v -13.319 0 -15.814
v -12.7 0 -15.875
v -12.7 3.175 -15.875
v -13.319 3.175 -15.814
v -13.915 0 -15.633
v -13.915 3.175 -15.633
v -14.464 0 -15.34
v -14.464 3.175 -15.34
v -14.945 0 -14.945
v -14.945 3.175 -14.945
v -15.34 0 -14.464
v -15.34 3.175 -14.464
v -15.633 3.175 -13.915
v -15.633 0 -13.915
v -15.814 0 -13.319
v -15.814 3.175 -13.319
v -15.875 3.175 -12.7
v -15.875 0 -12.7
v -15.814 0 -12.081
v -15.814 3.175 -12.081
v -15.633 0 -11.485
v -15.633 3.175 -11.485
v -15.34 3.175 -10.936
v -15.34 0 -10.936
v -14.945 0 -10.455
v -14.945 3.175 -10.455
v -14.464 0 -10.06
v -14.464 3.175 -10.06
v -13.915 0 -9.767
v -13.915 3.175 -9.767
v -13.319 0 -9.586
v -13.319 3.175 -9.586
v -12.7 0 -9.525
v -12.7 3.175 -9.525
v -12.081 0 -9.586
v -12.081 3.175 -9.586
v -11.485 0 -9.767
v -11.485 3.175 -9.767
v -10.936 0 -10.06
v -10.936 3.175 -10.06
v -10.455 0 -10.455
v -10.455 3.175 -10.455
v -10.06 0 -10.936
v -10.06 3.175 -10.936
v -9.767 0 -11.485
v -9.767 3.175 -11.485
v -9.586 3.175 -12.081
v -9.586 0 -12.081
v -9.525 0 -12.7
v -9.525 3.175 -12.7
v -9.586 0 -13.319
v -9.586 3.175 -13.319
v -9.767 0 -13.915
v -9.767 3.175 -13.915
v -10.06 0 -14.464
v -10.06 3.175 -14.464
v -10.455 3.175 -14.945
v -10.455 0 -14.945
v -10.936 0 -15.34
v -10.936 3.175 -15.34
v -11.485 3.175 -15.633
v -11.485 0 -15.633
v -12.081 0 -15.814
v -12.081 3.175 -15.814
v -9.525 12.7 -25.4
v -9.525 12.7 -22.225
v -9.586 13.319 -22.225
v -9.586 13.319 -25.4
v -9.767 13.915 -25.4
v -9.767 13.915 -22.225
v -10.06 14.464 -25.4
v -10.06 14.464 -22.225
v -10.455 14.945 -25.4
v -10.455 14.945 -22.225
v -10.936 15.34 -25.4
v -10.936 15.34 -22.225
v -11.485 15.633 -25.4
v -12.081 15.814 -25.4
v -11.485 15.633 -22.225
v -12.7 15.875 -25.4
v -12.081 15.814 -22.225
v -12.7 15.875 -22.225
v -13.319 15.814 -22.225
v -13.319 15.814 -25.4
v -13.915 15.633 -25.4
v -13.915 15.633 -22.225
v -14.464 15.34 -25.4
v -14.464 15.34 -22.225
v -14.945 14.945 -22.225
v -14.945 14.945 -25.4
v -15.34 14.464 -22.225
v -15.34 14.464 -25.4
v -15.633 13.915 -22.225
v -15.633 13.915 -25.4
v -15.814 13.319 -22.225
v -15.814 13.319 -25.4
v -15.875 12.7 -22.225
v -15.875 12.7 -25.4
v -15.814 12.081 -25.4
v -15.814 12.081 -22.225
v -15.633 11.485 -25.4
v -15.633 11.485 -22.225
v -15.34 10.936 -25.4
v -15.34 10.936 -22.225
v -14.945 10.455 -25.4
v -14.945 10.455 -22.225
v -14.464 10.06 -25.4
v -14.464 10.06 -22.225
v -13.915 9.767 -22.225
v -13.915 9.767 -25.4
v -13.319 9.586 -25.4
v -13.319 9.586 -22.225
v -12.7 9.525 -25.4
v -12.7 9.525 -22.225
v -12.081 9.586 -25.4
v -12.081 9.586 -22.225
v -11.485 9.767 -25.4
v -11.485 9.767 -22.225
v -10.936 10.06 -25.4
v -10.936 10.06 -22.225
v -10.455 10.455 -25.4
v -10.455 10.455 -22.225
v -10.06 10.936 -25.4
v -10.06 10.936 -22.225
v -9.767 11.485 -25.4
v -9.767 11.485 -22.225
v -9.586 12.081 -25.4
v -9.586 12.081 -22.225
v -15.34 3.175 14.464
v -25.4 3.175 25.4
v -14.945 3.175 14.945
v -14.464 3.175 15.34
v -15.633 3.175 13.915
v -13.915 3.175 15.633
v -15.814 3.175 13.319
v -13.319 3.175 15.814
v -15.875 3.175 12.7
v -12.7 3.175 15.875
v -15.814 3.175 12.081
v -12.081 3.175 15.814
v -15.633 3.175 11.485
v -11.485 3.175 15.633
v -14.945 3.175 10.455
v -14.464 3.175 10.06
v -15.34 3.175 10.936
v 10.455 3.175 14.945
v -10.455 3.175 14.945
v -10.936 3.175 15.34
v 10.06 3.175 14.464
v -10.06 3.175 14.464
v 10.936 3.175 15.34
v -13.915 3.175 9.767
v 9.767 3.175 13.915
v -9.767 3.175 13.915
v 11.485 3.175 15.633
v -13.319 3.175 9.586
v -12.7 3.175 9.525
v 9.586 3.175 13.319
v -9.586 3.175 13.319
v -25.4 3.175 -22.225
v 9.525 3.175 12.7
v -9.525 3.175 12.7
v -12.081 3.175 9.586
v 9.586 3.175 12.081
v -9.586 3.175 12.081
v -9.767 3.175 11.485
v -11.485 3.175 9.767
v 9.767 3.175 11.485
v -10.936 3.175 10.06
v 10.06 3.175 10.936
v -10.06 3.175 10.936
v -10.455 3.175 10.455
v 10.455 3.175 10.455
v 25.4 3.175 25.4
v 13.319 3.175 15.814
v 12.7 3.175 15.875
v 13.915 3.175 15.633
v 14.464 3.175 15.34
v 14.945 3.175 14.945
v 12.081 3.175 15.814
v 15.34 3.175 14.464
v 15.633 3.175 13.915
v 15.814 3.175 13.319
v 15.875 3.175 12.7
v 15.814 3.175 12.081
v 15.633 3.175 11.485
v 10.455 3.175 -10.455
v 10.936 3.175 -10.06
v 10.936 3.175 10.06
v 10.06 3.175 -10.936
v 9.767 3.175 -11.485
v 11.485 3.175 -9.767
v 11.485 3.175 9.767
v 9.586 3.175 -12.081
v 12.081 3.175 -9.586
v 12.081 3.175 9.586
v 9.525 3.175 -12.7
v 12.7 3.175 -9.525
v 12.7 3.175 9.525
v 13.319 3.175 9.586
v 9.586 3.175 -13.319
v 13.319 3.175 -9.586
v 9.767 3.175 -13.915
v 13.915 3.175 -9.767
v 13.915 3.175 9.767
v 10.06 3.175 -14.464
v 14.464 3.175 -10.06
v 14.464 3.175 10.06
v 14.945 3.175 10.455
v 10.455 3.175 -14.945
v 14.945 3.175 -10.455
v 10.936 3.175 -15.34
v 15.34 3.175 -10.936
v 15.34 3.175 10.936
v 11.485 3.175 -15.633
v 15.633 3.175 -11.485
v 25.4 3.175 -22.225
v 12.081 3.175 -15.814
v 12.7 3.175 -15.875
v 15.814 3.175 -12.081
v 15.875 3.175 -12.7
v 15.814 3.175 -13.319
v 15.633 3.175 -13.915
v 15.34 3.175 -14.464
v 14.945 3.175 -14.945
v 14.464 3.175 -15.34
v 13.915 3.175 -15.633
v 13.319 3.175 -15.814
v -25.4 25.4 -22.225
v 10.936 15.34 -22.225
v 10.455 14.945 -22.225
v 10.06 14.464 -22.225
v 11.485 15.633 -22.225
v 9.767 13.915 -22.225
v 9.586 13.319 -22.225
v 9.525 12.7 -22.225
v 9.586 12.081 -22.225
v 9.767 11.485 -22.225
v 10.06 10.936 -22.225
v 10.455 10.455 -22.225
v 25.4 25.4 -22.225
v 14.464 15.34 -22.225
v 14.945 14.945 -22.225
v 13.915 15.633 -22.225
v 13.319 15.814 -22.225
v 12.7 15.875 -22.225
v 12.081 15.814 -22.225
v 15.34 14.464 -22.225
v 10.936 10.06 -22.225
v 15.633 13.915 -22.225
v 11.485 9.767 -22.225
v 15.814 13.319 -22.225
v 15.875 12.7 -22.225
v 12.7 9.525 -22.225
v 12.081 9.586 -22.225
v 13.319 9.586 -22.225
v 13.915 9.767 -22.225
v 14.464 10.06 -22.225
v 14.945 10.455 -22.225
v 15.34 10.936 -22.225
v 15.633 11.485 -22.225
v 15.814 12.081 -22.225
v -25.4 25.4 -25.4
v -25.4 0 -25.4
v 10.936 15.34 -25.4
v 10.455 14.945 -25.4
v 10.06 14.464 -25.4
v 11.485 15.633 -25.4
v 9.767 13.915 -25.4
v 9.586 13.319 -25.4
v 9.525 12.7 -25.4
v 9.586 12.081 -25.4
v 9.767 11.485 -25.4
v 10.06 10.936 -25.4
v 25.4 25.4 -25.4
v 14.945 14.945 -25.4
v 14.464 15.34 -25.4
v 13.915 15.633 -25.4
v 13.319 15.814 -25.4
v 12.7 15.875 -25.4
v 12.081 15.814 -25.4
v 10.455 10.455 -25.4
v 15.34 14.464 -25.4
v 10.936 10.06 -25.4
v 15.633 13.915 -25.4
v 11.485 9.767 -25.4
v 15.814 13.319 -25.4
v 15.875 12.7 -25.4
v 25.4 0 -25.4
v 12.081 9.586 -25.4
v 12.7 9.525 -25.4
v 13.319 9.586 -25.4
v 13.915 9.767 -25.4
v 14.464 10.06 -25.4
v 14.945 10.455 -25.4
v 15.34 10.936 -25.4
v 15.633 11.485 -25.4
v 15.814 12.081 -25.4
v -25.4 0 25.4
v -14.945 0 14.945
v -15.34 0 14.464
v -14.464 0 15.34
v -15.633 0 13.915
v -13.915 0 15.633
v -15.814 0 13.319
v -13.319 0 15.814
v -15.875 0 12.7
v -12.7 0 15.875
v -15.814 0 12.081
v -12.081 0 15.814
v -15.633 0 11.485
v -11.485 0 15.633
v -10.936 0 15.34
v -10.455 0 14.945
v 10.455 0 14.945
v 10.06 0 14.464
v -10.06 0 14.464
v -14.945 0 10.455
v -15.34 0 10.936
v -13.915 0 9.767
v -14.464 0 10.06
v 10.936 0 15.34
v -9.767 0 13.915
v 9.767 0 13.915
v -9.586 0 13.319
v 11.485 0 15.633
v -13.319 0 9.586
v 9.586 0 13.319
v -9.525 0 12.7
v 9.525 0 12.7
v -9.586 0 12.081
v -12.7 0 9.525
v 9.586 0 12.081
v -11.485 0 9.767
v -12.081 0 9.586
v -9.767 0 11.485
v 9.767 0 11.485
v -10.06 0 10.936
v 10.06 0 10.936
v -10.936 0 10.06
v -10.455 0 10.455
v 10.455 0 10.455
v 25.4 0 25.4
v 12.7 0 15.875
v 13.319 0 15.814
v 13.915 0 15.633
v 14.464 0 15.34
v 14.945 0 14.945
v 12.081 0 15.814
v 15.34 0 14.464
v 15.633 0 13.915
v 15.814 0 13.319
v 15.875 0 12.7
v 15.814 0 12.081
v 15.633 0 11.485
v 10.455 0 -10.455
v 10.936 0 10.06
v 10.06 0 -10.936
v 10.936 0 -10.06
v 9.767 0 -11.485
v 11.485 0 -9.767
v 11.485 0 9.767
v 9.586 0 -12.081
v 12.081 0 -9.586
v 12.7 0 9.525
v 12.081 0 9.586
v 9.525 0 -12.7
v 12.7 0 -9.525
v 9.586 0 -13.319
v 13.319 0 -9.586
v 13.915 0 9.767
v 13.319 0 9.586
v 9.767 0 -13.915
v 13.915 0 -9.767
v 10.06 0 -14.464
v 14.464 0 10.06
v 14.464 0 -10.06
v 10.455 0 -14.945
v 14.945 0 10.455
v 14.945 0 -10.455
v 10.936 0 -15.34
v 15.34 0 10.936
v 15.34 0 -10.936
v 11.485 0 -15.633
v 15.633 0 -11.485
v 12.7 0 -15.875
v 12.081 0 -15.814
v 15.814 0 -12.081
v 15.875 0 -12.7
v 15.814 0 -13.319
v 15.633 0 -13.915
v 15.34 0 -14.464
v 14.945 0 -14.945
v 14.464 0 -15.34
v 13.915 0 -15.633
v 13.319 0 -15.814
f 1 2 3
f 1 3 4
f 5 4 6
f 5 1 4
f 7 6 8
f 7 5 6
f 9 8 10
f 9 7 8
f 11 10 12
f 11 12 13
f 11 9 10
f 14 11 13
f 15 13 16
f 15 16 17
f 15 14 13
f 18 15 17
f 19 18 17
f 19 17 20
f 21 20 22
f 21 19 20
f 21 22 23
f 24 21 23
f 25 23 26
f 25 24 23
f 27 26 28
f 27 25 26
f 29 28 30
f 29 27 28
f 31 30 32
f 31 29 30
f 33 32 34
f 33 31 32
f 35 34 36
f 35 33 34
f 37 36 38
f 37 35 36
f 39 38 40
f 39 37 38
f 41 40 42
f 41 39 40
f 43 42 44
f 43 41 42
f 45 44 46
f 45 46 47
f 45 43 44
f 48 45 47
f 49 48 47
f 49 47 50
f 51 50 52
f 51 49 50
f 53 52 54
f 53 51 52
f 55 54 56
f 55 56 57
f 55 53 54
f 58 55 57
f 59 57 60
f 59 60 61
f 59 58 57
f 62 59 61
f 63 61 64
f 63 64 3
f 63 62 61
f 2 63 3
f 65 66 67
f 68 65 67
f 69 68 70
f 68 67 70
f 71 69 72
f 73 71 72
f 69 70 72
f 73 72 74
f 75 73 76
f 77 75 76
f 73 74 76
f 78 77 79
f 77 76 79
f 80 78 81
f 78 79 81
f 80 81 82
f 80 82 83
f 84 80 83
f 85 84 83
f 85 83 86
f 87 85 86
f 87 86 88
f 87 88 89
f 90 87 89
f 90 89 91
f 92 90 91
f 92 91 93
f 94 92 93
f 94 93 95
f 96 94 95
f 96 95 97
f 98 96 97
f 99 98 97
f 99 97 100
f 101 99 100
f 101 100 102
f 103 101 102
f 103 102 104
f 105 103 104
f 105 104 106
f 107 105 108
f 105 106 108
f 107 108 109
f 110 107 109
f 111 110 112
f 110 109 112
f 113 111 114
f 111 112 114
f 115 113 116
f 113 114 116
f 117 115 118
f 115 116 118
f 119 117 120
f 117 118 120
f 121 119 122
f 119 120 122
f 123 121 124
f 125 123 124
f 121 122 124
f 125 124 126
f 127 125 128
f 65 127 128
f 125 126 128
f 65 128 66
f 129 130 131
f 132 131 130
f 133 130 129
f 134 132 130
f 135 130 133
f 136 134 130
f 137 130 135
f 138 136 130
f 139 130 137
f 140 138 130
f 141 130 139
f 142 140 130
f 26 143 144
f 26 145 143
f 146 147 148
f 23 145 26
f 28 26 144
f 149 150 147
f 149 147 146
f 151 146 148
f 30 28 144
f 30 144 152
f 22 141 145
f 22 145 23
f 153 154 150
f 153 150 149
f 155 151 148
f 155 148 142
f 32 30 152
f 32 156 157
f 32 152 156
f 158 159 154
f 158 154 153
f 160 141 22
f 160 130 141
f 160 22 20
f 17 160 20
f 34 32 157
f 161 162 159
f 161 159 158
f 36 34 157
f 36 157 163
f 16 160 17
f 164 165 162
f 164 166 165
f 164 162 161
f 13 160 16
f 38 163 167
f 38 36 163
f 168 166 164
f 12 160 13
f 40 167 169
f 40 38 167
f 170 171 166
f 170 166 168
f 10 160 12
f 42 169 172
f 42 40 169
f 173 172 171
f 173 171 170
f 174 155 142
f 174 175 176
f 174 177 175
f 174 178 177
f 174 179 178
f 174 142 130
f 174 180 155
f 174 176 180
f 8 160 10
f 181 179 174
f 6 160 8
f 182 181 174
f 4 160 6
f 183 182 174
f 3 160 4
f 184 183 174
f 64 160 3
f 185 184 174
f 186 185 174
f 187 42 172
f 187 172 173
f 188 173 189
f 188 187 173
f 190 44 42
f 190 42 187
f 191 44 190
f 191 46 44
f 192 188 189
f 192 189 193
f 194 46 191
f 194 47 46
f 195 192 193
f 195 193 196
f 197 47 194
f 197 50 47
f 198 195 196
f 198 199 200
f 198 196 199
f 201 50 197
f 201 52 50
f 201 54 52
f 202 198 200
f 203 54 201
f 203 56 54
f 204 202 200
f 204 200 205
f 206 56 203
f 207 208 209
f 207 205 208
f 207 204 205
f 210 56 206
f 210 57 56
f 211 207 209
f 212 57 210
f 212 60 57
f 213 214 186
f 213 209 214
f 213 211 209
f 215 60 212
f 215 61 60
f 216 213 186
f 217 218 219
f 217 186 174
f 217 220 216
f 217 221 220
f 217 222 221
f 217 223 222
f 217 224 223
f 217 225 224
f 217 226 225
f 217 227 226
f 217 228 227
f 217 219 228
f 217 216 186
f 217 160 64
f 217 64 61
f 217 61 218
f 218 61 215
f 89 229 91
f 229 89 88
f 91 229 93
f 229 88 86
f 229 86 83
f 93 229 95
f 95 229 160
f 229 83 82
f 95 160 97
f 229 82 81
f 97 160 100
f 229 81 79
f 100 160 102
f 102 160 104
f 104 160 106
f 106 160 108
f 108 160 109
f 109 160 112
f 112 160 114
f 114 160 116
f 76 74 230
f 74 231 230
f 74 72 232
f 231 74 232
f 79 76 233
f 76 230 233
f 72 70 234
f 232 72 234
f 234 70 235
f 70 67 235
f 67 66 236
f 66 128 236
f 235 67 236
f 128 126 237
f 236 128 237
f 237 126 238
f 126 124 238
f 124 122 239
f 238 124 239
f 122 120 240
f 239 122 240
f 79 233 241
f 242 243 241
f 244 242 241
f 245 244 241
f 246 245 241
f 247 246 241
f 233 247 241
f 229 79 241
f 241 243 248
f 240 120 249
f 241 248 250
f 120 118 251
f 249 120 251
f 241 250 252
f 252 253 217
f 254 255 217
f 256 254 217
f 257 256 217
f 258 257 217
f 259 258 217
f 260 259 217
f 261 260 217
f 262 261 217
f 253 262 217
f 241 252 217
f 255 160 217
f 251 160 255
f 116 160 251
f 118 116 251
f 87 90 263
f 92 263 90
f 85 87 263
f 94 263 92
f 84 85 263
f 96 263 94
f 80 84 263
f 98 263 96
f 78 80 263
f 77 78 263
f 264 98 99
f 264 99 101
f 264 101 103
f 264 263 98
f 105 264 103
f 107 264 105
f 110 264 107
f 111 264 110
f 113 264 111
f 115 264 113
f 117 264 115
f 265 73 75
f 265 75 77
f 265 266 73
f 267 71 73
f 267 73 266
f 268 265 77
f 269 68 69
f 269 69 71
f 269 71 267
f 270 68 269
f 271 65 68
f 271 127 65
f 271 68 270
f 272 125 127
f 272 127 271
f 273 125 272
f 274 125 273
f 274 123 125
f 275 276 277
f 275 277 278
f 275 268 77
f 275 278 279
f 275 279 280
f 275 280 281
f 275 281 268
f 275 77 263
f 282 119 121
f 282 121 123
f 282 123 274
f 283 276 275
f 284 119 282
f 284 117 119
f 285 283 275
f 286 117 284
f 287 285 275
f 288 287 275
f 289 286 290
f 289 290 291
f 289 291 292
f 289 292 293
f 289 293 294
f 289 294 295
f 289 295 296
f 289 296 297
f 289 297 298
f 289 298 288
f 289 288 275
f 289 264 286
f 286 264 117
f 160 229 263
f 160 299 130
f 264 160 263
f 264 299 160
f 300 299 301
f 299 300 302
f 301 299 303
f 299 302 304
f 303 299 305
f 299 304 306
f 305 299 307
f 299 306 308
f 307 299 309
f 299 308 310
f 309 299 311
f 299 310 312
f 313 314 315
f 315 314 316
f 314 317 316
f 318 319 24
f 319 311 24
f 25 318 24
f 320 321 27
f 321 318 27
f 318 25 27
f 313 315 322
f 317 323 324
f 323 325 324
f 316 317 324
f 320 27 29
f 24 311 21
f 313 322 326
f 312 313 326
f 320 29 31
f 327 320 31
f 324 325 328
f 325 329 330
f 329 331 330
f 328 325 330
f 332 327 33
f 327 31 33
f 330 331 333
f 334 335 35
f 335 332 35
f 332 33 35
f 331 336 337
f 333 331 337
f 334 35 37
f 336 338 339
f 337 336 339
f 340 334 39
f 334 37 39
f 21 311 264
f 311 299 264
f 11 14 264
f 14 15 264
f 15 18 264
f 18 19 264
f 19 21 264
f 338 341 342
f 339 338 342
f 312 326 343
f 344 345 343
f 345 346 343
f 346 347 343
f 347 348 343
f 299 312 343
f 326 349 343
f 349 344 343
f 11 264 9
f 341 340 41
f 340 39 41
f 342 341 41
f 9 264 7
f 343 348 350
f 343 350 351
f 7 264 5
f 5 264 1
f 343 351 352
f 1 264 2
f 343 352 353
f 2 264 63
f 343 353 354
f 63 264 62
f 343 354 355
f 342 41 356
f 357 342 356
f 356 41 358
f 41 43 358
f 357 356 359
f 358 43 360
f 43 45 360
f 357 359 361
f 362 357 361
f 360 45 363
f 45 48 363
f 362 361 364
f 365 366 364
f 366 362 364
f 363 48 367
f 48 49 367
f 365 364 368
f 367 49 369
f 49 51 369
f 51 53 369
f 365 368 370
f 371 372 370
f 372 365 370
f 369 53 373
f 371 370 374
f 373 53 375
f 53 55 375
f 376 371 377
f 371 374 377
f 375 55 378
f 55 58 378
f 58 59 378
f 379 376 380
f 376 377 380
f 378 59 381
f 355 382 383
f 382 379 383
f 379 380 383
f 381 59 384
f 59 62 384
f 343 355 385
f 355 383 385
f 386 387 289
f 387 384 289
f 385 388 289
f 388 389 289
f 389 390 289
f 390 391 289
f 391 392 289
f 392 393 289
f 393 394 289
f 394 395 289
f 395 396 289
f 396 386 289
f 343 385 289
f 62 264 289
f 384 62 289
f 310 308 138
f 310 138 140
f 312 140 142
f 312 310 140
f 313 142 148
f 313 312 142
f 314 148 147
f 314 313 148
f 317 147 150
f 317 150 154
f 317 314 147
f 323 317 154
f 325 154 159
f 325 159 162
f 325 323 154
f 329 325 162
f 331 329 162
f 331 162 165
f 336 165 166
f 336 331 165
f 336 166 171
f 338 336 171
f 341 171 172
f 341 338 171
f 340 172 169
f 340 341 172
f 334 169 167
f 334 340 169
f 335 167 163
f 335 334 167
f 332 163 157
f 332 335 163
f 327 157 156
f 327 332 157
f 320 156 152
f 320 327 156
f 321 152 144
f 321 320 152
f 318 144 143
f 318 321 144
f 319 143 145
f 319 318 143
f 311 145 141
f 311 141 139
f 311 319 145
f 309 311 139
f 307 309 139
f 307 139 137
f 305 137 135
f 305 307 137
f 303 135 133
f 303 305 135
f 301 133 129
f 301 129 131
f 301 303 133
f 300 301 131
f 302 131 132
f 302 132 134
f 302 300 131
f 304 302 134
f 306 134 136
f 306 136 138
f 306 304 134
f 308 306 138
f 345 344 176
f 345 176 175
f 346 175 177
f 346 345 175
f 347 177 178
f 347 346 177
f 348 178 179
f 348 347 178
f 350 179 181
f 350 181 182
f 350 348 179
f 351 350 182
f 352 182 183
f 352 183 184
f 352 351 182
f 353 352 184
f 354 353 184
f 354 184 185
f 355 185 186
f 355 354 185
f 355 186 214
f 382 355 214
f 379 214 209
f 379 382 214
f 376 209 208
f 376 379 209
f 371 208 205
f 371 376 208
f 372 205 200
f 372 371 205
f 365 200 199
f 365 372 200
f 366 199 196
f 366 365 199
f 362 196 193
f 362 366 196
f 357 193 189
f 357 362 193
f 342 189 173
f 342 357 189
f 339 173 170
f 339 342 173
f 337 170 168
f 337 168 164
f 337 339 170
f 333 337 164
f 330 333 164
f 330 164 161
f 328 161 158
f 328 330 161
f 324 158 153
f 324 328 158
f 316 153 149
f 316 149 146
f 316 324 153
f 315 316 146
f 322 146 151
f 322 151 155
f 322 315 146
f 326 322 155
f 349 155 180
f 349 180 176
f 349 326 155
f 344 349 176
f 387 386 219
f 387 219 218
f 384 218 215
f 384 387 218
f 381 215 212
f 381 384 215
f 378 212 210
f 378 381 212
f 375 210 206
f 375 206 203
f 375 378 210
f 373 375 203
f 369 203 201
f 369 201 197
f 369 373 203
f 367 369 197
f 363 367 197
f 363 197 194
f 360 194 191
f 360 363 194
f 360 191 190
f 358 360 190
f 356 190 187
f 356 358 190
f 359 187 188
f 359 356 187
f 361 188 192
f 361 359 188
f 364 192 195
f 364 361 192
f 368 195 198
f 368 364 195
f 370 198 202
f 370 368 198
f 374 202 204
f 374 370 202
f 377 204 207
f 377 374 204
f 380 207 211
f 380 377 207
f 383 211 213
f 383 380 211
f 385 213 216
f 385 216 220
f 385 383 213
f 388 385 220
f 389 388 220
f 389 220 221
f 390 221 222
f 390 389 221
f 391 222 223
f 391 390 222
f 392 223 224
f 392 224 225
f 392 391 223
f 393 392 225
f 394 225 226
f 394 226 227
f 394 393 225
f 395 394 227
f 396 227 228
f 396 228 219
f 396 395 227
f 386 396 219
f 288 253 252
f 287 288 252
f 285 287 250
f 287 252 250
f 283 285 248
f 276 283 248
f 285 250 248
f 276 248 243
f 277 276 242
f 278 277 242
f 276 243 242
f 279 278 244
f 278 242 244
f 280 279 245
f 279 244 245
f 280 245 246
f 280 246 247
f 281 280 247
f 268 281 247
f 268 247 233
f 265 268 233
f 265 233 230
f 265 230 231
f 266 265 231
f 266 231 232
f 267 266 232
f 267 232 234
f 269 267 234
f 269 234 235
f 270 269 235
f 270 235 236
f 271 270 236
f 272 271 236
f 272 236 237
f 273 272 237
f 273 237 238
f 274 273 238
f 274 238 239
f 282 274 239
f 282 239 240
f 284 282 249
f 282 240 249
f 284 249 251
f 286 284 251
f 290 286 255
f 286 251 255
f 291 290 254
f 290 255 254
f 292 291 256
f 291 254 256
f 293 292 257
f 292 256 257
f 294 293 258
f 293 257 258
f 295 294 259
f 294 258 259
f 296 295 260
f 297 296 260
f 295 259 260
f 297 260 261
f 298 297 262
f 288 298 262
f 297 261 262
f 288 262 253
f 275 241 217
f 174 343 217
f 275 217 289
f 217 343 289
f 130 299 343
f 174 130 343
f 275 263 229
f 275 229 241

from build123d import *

# Parameters (mm, degrees)
SKETCH1_W           = 50.8
SKETCH1_H           = 50.8
SKETCH1_R           = 3.175
BOSS_EXTRUDE1_DEPTH = 3.175
SKETCH2_W           = 50.8
SKETCH2_H           = 3.175
BOSS_EXTRUDE2_DEPTH = 22.225
CUT_EXTRUDE1_REACH  = 61.653
SKETCH3_R           = 3.175


with BuildPart() as part:
    # Sketch1 → Boss-Extrude1 (new body)
    with BuildSketch(Plane(origin=(0, 0, 0), x_dir=(1, 0, 0), z_dir=(0, 1, 0))):
        Rectangle(SKETCH1_W, SKETCH1_H)
        with Locations(Location((-12.7, -12.7, 0), (0, 0, 270))):
            Circle(SKETCH1_R, mode=Mode.SUBTRACT)
        with Locations(Location((12.7, 12.7, 0), (0, 0, 90))):
            Circle(SKETCH1_R, mode=Mode.SUBTRACT)
        with Locations(Location((12.7, -12.7, 0), (0, 0, 270))):
            Circle(SKETCH1_R, mode=Mode.SUBTRACT)
        with Locations(Location((-12.7, 12.7, 0), (0, 0, 90))):
            Circle(SKETCH1_R, mode=Mode.SUBTRACT)
    extrude(amount=BOSS_EXTRUDE1_DEPTH)

    # Sketch2 → Boss-Extrude2 (add)
    with BuildSketch(Plane(origin=(0, 3.175, 0), x_dir=(1, 0, 0), z_dir=(0, 1, 0))):
        with Locations((0, 23.8125)):
            Rectangle(SKETCH2_W, SKETCH2_H)
    extrude(amount=BOSS_EXTRUDE2_DEPTH)

    # Sketch3 → Cut-Extrude1 (cut, up to next)
    with BuildSketch(Plane.XY.offset(-22.225), mode=Mode.PRIVATE) as cut_extrude1_sk1:
        with Locations((-12.7, 12.7)):
            Circle(SKETCH3_R)
    cut_extrude1_tool1 = extrude(cut_extrude1_sk1.sketch, amount=-CUT_EXTRUDE1_REACH, mode=Mode.PRIVATE) & part.part
    # Sketch3 → Cut-Extrude1 (cut, up to next)
    with BuildSketch(Plane.XY.offset(-22.225), mode=Mode.PRIVATE) as cut_extrude1_sk2:
        with Locations((12.7, 12.7)):
            Circle(SKETCH3_R)
    cut_extrude1_tool2 = extrude(cut_extrude1_sk2.sketch, amount=-CUT_EXTRUDE1_REACH, mode=Mode.PRIVATE) & part.part
    add(cut_extrude1_tool1.solids().sort_by_distance((-12.7, 12.7, -22.225))[0], mode=Mode.SUBTRACT)
    add(cut_extrude1_tool2.solids().sort_by_distance((12.7, 12.7, -22.225))[0], mode=Mode.SUBTRACT)


solid = part.part
